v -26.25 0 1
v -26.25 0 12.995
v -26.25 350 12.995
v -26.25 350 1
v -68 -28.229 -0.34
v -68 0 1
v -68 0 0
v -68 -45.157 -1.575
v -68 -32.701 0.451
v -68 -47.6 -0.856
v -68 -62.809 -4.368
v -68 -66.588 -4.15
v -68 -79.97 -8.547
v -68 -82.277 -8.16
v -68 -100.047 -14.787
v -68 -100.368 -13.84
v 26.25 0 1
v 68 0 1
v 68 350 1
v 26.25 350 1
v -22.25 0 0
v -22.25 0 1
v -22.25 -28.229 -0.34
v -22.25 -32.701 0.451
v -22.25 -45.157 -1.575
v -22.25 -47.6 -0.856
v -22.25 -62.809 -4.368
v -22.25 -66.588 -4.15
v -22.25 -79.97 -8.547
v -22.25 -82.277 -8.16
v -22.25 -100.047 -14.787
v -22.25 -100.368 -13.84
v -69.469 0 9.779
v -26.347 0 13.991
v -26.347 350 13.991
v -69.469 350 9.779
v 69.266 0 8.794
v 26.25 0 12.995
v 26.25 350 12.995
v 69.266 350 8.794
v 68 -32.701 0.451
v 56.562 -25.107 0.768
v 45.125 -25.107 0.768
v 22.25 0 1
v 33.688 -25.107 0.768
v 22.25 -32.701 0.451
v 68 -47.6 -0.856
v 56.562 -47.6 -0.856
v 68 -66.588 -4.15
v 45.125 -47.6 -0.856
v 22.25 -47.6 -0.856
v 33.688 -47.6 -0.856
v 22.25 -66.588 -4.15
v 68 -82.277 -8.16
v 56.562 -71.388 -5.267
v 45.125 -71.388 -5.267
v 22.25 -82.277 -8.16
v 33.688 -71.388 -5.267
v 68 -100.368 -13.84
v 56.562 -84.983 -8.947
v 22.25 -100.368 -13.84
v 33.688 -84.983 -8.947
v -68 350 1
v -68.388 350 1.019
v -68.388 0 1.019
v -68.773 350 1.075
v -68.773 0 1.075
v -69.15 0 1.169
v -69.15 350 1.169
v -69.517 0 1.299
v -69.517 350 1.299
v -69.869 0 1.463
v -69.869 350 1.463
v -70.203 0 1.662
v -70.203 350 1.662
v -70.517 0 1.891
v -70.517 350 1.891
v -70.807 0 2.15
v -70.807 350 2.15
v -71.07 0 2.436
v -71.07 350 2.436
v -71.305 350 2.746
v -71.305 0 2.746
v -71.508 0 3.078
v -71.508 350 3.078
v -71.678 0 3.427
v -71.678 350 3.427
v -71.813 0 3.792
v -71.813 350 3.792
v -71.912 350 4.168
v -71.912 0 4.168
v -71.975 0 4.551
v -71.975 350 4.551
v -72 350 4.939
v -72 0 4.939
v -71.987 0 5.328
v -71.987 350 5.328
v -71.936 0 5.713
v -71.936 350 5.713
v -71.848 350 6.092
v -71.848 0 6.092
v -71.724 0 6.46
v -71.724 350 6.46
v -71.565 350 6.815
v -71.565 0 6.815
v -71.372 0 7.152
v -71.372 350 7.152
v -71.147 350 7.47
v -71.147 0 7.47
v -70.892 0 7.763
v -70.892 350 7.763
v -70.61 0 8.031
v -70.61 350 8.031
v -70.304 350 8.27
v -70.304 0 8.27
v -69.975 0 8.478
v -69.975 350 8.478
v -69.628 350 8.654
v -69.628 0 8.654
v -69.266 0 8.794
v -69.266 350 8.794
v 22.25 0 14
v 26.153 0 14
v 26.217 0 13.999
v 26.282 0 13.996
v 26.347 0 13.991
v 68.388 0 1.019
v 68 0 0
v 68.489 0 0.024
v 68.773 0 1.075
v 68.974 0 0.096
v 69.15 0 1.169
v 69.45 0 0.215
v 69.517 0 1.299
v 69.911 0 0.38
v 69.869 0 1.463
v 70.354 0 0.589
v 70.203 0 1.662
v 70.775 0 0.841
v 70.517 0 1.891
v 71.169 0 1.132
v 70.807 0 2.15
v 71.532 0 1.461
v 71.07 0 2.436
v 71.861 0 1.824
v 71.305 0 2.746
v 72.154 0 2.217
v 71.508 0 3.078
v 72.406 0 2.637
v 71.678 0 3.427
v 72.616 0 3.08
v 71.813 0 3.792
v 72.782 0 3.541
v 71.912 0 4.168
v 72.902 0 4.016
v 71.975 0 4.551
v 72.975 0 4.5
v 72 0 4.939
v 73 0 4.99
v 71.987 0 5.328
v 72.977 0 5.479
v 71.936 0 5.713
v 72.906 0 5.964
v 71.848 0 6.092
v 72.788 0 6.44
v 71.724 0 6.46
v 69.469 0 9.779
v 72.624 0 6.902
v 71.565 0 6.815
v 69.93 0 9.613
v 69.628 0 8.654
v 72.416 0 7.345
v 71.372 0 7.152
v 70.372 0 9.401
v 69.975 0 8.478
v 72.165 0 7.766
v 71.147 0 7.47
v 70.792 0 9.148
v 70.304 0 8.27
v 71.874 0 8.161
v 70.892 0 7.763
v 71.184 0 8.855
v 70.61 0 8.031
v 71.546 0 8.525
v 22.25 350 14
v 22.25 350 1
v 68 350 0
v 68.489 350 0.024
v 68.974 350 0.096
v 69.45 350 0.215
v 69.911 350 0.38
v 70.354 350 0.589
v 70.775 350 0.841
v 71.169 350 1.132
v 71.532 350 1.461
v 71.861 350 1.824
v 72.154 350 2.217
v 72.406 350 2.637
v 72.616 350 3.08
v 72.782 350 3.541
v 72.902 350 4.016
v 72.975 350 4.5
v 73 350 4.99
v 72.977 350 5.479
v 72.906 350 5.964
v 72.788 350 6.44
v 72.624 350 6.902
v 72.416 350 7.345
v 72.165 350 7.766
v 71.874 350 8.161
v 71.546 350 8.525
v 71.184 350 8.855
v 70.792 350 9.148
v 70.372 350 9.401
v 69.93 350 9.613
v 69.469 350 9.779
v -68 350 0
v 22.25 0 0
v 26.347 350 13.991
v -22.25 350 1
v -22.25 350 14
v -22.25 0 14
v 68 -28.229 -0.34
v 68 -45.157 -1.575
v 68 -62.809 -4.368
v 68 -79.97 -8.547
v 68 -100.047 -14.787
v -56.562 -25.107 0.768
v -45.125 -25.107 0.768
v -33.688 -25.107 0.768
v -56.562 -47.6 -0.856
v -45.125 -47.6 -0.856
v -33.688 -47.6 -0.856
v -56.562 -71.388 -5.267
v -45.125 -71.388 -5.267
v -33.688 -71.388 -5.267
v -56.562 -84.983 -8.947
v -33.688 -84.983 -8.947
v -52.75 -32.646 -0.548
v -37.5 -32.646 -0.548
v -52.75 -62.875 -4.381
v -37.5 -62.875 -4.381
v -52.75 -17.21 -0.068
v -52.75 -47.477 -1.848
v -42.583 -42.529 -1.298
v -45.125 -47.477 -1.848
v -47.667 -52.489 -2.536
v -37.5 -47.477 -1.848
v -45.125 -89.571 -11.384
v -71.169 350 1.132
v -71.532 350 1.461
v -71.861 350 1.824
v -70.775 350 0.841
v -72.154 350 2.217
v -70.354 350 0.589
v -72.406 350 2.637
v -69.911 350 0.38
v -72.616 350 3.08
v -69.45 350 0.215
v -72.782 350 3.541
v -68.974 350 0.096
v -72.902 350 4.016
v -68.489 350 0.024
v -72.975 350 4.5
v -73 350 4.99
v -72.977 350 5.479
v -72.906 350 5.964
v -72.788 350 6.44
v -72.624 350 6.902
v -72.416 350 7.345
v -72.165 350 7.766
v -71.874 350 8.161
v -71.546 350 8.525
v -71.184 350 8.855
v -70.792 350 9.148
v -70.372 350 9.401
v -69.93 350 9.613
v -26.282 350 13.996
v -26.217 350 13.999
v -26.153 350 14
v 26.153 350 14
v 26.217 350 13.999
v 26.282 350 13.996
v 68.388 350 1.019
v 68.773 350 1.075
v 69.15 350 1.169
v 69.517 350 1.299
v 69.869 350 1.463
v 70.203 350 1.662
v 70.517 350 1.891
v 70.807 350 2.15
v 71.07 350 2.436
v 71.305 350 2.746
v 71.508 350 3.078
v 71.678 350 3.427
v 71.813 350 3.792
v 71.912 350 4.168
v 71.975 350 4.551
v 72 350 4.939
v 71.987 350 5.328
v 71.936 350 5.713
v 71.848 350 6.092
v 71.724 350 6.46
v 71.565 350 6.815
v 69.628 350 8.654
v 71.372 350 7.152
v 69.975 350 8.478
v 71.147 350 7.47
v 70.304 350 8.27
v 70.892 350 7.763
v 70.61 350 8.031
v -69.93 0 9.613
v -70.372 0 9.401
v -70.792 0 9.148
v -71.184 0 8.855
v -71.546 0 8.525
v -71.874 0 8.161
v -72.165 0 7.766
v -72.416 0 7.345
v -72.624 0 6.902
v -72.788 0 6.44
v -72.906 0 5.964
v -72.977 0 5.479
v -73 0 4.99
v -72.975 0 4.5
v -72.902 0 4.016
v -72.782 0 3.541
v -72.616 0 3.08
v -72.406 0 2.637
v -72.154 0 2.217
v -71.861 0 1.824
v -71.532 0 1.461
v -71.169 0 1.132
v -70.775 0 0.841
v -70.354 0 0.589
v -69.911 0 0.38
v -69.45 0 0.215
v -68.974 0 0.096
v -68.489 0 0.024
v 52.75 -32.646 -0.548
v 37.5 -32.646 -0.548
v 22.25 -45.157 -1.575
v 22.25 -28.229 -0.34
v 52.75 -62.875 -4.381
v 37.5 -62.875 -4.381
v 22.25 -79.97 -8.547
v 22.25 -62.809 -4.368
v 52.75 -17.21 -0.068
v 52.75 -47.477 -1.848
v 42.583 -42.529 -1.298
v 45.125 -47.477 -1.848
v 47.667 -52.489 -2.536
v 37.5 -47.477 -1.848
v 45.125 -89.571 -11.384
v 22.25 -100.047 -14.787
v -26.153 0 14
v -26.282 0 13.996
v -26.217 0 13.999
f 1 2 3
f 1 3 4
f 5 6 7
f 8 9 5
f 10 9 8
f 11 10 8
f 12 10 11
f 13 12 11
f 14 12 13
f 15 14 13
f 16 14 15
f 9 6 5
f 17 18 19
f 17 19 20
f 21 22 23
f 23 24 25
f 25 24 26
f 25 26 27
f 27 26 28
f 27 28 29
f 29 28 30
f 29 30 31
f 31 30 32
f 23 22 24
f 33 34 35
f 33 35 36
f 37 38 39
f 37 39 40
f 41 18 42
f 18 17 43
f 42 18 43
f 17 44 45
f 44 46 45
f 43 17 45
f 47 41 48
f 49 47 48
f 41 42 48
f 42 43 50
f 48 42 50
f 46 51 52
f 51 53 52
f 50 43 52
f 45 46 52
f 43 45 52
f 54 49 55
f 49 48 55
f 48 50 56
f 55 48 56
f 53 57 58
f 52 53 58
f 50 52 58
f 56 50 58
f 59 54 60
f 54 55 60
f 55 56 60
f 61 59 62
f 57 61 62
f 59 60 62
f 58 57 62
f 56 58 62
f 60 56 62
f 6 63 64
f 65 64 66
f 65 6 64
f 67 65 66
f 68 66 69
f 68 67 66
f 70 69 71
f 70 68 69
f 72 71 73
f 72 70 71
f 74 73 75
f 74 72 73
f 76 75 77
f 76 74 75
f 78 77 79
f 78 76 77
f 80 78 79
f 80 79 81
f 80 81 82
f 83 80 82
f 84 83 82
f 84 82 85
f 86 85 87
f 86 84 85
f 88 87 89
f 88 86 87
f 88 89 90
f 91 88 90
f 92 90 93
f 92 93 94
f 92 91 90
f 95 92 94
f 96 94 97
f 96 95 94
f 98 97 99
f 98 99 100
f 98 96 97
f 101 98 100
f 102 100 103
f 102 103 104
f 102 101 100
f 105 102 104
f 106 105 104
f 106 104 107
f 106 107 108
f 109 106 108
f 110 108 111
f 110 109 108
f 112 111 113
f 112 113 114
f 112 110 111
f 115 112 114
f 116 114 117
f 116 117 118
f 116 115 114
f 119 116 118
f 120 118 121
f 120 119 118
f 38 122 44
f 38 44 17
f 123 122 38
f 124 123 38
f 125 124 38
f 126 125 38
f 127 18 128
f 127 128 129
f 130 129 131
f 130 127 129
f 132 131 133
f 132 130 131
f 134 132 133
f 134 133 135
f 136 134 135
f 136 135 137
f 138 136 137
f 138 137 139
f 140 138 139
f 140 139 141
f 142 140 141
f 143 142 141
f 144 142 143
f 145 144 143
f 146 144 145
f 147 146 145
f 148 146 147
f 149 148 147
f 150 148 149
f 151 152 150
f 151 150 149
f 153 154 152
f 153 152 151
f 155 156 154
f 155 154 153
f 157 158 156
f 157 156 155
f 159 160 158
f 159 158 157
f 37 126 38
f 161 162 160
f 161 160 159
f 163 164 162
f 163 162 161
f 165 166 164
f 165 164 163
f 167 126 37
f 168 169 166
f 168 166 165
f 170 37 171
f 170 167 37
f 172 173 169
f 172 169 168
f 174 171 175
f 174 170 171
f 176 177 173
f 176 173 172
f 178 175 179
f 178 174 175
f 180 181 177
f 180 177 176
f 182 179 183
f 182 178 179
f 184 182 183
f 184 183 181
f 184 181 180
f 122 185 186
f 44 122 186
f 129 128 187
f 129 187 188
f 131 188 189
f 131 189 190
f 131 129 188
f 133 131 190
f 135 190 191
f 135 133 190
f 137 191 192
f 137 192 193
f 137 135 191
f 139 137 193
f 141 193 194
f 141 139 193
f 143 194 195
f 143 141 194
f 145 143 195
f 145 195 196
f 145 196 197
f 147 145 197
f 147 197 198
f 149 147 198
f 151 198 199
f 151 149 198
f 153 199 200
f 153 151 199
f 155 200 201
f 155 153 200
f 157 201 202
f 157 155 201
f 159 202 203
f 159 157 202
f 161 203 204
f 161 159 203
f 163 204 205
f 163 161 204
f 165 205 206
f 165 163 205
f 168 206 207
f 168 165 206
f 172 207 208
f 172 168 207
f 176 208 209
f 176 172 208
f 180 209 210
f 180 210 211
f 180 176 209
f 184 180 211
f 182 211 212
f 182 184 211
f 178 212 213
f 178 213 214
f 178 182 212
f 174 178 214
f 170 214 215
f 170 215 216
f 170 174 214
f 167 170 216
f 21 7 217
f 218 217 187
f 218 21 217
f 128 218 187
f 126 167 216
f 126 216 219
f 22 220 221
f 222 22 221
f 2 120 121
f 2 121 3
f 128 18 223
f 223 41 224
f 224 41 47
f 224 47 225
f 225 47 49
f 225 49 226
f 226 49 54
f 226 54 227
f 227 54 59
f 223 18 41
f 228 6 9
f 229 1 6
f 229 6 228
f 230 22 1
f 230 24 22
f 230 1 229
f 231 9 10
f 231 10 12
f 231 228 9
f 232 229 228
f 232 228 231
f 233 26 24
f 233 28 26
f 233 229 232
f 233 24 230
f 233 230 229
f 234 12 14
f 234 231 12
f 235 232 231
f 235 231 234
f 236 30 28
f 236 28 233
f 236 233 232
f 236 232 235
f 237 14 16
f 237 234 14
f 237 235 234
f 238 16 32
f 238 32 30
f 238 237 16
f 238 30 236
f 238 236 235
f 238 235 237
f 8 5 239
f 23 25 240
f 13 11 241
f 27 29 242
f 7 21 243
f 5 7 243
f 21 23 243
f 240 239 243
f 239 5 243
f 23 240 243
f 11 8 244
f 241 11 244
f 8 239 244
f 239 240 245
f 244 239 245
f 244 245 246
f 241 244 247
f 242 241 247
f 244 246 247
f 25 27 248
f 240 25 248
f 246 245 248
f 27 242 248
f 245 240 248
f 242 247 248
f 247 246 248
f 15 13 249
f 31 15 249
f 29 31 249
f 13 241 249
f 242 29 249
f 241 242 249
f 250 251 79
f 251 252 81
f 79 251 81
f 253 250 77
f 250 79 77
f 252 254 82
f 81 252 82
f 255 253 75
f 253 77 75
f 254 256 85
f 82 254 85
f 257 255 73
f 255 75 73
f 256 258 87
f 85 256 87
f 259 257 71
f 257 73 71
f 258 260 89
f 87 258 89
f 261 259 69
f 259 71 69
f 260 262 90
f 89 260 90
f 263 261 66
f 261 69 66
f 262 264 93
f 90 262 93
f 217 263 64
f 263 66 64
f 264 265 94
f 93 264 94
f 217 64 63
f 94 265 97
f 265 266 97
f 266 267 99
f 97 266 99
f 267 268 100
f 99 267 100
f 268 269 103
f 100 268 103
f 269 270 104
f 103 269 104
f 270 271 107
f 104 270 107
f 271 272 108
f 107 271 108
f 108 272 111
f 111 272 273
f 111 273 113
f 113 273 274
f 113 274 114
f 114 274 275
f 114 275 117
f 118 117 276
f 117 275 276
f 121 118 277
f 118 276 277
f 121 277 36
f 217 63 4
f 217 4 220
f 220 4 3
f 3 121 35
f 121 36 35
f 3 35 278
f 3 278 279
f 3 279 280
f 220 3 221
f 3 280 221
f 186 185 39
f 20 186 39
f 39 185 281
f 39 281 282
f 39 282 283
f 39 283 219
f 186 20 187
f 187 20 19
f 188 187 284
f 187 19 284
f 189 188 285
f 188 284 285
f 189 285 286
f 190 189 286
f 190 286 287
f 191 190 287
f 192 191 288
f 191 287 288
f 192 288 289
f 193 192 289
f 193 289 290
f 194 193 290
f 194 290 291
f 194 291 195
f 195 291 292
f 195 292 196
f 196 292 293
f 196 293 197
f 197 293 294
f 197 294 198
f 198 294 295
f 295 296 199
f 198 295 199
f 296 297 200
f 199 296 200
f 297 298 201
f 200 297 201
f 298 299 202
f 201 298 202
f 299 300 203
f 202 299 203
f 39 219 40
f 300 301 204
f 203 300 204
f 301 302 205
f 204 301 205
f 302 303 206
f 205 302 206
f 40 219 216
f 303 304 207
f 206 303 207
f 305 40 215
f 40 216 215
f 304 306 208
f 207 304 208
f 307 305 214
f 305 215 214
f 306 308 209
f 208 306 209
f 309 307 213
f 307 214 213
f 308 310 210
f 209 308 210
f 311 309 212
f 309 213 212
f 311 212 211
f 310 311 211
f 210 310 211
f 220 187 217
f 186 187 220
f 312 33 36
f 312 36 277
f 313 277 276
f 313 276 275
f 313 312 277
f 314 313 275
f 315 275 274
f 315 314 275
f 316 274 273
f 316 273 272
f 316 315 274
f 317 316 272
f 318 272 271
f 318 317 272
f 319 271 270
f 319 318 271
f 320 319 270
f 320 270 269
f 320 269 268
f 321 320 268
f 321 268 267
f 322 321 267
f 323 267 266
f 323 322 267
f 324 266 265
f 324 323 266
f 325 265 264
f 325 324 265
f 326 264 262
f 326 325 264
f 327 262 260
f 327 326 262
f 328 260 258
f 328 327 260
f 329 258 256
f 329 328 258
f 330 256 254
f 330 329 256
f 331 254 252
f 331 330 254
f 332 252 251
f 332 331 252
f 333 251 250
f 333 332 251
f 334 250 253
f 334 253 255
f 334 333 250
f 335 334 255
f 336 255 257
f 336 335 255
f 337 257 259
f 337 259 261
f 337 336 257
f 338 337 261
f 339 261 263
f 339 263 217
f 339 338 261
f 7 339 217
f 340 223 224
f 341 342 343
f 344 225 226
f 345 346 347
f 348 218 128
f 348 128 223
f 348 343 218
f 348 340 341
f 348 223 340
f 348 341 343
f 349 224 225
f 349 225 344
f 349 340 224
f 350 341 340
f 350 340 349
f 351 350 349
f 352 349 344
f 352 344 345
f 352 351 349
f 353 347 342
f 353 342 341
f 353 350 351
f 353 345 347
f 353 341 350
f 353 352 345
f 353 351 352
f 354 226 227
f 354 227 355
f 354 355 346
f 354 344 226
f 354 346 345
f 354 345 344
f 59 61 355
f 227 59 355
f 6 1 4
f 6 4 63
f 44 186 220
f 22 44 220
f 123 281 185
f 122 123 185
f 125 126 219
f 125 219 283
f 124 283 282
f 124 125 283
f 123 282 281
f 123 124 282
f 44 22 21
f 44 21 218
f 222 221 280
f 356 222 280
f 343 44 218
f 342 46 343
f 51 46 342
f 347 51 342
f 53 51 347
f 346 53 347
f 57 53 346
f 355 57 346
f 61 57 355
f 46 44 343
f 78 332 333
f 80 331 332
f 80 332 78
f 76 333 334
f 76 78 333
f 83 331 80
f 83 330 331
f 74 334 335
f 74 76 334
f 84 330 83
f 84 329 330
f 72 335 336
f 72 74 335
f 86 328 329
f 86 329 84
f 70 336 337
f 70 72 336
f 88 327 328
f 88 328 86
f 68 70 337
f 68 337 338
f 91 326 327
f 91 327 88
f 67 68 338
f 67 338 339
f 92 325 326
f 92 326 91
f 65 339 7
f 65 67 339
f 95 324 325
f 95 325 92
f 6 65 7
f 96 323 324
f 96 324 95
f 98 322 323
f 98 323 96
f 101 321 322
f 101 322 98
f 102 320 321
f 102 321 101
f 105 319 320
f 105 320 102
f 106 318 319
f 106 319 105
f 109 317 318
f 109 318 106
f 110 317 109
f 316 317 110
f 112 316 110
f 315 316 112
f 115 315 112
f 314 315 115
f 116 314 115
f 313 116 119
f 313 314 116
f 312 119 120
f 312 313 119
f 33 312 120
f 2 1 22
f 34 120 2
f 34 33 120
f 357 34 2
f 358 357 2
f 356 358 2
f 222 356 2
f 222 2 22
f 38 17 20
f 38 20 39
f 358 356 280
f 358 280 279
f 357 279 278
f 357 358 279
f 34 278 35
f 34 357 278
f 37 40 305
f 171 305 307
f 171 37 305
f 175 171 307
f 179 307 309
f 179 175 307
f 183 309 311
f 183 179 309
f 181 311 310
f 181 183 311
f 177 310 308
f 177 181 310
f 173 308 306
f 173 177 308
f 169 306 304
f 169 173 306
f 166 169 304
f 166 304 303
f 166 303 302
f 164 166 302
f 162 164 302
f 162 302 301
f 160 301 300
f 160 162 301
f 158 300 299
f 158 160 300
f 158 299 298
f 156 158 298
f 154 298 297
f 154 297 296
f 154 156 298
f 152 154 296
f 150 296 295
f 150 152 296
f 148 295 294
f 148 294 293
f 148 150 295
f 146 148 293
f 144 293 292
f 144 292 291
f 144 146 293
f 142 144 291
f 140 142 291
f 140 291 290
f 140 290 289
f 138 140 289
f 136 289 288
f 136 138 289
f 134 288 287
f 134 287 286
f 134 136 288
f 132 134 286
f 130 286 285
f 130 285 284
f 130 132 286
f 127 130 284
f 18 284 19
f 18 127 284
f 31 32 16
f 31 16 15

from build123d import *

# Parameters (mm, degrees)
F1_DEPTH = 350
F4_DEPTH = 45.75


with BuildPart() as f1:
    # F0 (on Front) → F1 (new body)
    with BuildSketch(Plane.XZ):
        with BuildLine():
            ThreePointArc((-69.4691266018, 9.7792956623), (-72.9445160689, 4.257193939), (-68, 0))
            Line((-68, 0), (0, 0))
            Line((0, 0), (68, 0))
            ThreePointArc((68, 0), (72.9445160689, 4.257193939), (69.4691266018, 9.7792956623))
            Line((69.4691266018, 9.7792956623), (26.3469652224, 13.9905305459))
            ThreePointArc((26.3469652224, 13.9905305459), (26.2498846097, 13.9976312337), (26.1525734896, 14))
            Line((26.1525734896, 14), (26.0150079844, 14))
            Line((26.0150079844, 14), (22.25, 14))
            Line((22.25, 14), (22.25, 1))
            Line((22.25, 1), (0, 1))
            Line((0, 1), (-22.25, 1))
            Line((-22.25, 1), (-22.25, 14))
            Line((-22.25, 14), (-26.0150079844, 14))
            Line((-26.0150079844, 14), (-26.1525734896, 14))
            ThreePointArc((-26.1525734896, 14), (-26.2498846097, 13.9976312337), (-26.3469652224, 13.9905305459))
            Line((-26.3469652224, 13.9905305459), (-69.4691266018, 9.7792956623))
        make_face()
        with BuildLine():
            Line((-26.25, 12.9720028672), (-26.25, 1))
            Line((-26.25, 1), (-68, 1))
            ThreePointArc((-68, 1), (-71.9482597731, 4.3587163152), (-69.265977288, 8.7943776178))
            Line((-69.265977288, 8.7943776178), (-26.25, 12.9952427487))
            Line((-26.25, 12.9952427487), (-26.25, 12.9720028672))
        make_face(mode=Mode.SUBTRACT)
        with BuildLine():
            Line((68, 1), (26.25, 1))
            Line((26.25, 1), (26.25, 12.9720028672))
            Line((26.25, 12.9720028672), (26.25, 12.9952427487))
            Line((26.25, 12.9952427487), (69.265977288, 8.7943776178))
            ThreePointArc((69.265977288, 8.7943776178), (71.9482597731, 4.3587163152), (68, 1))
        make_face(mode=Mode.SUBTRACT)
    extrude(amount=-F1_DEPTH)

    # F3 (on offset) → F4 (join)
    with BuildSketch(Plane.YZ.offset(-22.25)):
        with BuildLine():
            add(Edge.make_bspline(
                [(0, 0), (-36.9747690856, 0), (-56.282736361, 0), (-100.0474691391, -14.7872483358)],
                knots=[0, 0, 0, 0, 101.1343601081, 101.1343601081, 101.1343601081, 101.1343601081], degree=3))
            Line((0, 0), (0, 1))
            add(Edge.make_bspline(
                [(0, 1), (-9.2436922714, 1), (-25.5401100661, 1.0005275684), (-47.3845795682, -0.3908549289), (-70.5242758511, -4.5730687745), (-89.4052629561, -10.135915446), (-100.3675713535, -13.8398653233)],
                knots=[0, 0, 0, 0, 0.25, 0.5, 0.75, 1, 1, 1, 1], degree=3))
            Line((-100.3675713535, -13.8398653233), (-100.0474691391, -14.7872483358))
        make_face()
    extrude(amount=-F4_DEPTH)

    # F5: F1 across plane


with BuildPart() as f1_1:
    add(f1.part)
    add(f1.part.mirror(Plane.YZ))


solid = f1_1.part
